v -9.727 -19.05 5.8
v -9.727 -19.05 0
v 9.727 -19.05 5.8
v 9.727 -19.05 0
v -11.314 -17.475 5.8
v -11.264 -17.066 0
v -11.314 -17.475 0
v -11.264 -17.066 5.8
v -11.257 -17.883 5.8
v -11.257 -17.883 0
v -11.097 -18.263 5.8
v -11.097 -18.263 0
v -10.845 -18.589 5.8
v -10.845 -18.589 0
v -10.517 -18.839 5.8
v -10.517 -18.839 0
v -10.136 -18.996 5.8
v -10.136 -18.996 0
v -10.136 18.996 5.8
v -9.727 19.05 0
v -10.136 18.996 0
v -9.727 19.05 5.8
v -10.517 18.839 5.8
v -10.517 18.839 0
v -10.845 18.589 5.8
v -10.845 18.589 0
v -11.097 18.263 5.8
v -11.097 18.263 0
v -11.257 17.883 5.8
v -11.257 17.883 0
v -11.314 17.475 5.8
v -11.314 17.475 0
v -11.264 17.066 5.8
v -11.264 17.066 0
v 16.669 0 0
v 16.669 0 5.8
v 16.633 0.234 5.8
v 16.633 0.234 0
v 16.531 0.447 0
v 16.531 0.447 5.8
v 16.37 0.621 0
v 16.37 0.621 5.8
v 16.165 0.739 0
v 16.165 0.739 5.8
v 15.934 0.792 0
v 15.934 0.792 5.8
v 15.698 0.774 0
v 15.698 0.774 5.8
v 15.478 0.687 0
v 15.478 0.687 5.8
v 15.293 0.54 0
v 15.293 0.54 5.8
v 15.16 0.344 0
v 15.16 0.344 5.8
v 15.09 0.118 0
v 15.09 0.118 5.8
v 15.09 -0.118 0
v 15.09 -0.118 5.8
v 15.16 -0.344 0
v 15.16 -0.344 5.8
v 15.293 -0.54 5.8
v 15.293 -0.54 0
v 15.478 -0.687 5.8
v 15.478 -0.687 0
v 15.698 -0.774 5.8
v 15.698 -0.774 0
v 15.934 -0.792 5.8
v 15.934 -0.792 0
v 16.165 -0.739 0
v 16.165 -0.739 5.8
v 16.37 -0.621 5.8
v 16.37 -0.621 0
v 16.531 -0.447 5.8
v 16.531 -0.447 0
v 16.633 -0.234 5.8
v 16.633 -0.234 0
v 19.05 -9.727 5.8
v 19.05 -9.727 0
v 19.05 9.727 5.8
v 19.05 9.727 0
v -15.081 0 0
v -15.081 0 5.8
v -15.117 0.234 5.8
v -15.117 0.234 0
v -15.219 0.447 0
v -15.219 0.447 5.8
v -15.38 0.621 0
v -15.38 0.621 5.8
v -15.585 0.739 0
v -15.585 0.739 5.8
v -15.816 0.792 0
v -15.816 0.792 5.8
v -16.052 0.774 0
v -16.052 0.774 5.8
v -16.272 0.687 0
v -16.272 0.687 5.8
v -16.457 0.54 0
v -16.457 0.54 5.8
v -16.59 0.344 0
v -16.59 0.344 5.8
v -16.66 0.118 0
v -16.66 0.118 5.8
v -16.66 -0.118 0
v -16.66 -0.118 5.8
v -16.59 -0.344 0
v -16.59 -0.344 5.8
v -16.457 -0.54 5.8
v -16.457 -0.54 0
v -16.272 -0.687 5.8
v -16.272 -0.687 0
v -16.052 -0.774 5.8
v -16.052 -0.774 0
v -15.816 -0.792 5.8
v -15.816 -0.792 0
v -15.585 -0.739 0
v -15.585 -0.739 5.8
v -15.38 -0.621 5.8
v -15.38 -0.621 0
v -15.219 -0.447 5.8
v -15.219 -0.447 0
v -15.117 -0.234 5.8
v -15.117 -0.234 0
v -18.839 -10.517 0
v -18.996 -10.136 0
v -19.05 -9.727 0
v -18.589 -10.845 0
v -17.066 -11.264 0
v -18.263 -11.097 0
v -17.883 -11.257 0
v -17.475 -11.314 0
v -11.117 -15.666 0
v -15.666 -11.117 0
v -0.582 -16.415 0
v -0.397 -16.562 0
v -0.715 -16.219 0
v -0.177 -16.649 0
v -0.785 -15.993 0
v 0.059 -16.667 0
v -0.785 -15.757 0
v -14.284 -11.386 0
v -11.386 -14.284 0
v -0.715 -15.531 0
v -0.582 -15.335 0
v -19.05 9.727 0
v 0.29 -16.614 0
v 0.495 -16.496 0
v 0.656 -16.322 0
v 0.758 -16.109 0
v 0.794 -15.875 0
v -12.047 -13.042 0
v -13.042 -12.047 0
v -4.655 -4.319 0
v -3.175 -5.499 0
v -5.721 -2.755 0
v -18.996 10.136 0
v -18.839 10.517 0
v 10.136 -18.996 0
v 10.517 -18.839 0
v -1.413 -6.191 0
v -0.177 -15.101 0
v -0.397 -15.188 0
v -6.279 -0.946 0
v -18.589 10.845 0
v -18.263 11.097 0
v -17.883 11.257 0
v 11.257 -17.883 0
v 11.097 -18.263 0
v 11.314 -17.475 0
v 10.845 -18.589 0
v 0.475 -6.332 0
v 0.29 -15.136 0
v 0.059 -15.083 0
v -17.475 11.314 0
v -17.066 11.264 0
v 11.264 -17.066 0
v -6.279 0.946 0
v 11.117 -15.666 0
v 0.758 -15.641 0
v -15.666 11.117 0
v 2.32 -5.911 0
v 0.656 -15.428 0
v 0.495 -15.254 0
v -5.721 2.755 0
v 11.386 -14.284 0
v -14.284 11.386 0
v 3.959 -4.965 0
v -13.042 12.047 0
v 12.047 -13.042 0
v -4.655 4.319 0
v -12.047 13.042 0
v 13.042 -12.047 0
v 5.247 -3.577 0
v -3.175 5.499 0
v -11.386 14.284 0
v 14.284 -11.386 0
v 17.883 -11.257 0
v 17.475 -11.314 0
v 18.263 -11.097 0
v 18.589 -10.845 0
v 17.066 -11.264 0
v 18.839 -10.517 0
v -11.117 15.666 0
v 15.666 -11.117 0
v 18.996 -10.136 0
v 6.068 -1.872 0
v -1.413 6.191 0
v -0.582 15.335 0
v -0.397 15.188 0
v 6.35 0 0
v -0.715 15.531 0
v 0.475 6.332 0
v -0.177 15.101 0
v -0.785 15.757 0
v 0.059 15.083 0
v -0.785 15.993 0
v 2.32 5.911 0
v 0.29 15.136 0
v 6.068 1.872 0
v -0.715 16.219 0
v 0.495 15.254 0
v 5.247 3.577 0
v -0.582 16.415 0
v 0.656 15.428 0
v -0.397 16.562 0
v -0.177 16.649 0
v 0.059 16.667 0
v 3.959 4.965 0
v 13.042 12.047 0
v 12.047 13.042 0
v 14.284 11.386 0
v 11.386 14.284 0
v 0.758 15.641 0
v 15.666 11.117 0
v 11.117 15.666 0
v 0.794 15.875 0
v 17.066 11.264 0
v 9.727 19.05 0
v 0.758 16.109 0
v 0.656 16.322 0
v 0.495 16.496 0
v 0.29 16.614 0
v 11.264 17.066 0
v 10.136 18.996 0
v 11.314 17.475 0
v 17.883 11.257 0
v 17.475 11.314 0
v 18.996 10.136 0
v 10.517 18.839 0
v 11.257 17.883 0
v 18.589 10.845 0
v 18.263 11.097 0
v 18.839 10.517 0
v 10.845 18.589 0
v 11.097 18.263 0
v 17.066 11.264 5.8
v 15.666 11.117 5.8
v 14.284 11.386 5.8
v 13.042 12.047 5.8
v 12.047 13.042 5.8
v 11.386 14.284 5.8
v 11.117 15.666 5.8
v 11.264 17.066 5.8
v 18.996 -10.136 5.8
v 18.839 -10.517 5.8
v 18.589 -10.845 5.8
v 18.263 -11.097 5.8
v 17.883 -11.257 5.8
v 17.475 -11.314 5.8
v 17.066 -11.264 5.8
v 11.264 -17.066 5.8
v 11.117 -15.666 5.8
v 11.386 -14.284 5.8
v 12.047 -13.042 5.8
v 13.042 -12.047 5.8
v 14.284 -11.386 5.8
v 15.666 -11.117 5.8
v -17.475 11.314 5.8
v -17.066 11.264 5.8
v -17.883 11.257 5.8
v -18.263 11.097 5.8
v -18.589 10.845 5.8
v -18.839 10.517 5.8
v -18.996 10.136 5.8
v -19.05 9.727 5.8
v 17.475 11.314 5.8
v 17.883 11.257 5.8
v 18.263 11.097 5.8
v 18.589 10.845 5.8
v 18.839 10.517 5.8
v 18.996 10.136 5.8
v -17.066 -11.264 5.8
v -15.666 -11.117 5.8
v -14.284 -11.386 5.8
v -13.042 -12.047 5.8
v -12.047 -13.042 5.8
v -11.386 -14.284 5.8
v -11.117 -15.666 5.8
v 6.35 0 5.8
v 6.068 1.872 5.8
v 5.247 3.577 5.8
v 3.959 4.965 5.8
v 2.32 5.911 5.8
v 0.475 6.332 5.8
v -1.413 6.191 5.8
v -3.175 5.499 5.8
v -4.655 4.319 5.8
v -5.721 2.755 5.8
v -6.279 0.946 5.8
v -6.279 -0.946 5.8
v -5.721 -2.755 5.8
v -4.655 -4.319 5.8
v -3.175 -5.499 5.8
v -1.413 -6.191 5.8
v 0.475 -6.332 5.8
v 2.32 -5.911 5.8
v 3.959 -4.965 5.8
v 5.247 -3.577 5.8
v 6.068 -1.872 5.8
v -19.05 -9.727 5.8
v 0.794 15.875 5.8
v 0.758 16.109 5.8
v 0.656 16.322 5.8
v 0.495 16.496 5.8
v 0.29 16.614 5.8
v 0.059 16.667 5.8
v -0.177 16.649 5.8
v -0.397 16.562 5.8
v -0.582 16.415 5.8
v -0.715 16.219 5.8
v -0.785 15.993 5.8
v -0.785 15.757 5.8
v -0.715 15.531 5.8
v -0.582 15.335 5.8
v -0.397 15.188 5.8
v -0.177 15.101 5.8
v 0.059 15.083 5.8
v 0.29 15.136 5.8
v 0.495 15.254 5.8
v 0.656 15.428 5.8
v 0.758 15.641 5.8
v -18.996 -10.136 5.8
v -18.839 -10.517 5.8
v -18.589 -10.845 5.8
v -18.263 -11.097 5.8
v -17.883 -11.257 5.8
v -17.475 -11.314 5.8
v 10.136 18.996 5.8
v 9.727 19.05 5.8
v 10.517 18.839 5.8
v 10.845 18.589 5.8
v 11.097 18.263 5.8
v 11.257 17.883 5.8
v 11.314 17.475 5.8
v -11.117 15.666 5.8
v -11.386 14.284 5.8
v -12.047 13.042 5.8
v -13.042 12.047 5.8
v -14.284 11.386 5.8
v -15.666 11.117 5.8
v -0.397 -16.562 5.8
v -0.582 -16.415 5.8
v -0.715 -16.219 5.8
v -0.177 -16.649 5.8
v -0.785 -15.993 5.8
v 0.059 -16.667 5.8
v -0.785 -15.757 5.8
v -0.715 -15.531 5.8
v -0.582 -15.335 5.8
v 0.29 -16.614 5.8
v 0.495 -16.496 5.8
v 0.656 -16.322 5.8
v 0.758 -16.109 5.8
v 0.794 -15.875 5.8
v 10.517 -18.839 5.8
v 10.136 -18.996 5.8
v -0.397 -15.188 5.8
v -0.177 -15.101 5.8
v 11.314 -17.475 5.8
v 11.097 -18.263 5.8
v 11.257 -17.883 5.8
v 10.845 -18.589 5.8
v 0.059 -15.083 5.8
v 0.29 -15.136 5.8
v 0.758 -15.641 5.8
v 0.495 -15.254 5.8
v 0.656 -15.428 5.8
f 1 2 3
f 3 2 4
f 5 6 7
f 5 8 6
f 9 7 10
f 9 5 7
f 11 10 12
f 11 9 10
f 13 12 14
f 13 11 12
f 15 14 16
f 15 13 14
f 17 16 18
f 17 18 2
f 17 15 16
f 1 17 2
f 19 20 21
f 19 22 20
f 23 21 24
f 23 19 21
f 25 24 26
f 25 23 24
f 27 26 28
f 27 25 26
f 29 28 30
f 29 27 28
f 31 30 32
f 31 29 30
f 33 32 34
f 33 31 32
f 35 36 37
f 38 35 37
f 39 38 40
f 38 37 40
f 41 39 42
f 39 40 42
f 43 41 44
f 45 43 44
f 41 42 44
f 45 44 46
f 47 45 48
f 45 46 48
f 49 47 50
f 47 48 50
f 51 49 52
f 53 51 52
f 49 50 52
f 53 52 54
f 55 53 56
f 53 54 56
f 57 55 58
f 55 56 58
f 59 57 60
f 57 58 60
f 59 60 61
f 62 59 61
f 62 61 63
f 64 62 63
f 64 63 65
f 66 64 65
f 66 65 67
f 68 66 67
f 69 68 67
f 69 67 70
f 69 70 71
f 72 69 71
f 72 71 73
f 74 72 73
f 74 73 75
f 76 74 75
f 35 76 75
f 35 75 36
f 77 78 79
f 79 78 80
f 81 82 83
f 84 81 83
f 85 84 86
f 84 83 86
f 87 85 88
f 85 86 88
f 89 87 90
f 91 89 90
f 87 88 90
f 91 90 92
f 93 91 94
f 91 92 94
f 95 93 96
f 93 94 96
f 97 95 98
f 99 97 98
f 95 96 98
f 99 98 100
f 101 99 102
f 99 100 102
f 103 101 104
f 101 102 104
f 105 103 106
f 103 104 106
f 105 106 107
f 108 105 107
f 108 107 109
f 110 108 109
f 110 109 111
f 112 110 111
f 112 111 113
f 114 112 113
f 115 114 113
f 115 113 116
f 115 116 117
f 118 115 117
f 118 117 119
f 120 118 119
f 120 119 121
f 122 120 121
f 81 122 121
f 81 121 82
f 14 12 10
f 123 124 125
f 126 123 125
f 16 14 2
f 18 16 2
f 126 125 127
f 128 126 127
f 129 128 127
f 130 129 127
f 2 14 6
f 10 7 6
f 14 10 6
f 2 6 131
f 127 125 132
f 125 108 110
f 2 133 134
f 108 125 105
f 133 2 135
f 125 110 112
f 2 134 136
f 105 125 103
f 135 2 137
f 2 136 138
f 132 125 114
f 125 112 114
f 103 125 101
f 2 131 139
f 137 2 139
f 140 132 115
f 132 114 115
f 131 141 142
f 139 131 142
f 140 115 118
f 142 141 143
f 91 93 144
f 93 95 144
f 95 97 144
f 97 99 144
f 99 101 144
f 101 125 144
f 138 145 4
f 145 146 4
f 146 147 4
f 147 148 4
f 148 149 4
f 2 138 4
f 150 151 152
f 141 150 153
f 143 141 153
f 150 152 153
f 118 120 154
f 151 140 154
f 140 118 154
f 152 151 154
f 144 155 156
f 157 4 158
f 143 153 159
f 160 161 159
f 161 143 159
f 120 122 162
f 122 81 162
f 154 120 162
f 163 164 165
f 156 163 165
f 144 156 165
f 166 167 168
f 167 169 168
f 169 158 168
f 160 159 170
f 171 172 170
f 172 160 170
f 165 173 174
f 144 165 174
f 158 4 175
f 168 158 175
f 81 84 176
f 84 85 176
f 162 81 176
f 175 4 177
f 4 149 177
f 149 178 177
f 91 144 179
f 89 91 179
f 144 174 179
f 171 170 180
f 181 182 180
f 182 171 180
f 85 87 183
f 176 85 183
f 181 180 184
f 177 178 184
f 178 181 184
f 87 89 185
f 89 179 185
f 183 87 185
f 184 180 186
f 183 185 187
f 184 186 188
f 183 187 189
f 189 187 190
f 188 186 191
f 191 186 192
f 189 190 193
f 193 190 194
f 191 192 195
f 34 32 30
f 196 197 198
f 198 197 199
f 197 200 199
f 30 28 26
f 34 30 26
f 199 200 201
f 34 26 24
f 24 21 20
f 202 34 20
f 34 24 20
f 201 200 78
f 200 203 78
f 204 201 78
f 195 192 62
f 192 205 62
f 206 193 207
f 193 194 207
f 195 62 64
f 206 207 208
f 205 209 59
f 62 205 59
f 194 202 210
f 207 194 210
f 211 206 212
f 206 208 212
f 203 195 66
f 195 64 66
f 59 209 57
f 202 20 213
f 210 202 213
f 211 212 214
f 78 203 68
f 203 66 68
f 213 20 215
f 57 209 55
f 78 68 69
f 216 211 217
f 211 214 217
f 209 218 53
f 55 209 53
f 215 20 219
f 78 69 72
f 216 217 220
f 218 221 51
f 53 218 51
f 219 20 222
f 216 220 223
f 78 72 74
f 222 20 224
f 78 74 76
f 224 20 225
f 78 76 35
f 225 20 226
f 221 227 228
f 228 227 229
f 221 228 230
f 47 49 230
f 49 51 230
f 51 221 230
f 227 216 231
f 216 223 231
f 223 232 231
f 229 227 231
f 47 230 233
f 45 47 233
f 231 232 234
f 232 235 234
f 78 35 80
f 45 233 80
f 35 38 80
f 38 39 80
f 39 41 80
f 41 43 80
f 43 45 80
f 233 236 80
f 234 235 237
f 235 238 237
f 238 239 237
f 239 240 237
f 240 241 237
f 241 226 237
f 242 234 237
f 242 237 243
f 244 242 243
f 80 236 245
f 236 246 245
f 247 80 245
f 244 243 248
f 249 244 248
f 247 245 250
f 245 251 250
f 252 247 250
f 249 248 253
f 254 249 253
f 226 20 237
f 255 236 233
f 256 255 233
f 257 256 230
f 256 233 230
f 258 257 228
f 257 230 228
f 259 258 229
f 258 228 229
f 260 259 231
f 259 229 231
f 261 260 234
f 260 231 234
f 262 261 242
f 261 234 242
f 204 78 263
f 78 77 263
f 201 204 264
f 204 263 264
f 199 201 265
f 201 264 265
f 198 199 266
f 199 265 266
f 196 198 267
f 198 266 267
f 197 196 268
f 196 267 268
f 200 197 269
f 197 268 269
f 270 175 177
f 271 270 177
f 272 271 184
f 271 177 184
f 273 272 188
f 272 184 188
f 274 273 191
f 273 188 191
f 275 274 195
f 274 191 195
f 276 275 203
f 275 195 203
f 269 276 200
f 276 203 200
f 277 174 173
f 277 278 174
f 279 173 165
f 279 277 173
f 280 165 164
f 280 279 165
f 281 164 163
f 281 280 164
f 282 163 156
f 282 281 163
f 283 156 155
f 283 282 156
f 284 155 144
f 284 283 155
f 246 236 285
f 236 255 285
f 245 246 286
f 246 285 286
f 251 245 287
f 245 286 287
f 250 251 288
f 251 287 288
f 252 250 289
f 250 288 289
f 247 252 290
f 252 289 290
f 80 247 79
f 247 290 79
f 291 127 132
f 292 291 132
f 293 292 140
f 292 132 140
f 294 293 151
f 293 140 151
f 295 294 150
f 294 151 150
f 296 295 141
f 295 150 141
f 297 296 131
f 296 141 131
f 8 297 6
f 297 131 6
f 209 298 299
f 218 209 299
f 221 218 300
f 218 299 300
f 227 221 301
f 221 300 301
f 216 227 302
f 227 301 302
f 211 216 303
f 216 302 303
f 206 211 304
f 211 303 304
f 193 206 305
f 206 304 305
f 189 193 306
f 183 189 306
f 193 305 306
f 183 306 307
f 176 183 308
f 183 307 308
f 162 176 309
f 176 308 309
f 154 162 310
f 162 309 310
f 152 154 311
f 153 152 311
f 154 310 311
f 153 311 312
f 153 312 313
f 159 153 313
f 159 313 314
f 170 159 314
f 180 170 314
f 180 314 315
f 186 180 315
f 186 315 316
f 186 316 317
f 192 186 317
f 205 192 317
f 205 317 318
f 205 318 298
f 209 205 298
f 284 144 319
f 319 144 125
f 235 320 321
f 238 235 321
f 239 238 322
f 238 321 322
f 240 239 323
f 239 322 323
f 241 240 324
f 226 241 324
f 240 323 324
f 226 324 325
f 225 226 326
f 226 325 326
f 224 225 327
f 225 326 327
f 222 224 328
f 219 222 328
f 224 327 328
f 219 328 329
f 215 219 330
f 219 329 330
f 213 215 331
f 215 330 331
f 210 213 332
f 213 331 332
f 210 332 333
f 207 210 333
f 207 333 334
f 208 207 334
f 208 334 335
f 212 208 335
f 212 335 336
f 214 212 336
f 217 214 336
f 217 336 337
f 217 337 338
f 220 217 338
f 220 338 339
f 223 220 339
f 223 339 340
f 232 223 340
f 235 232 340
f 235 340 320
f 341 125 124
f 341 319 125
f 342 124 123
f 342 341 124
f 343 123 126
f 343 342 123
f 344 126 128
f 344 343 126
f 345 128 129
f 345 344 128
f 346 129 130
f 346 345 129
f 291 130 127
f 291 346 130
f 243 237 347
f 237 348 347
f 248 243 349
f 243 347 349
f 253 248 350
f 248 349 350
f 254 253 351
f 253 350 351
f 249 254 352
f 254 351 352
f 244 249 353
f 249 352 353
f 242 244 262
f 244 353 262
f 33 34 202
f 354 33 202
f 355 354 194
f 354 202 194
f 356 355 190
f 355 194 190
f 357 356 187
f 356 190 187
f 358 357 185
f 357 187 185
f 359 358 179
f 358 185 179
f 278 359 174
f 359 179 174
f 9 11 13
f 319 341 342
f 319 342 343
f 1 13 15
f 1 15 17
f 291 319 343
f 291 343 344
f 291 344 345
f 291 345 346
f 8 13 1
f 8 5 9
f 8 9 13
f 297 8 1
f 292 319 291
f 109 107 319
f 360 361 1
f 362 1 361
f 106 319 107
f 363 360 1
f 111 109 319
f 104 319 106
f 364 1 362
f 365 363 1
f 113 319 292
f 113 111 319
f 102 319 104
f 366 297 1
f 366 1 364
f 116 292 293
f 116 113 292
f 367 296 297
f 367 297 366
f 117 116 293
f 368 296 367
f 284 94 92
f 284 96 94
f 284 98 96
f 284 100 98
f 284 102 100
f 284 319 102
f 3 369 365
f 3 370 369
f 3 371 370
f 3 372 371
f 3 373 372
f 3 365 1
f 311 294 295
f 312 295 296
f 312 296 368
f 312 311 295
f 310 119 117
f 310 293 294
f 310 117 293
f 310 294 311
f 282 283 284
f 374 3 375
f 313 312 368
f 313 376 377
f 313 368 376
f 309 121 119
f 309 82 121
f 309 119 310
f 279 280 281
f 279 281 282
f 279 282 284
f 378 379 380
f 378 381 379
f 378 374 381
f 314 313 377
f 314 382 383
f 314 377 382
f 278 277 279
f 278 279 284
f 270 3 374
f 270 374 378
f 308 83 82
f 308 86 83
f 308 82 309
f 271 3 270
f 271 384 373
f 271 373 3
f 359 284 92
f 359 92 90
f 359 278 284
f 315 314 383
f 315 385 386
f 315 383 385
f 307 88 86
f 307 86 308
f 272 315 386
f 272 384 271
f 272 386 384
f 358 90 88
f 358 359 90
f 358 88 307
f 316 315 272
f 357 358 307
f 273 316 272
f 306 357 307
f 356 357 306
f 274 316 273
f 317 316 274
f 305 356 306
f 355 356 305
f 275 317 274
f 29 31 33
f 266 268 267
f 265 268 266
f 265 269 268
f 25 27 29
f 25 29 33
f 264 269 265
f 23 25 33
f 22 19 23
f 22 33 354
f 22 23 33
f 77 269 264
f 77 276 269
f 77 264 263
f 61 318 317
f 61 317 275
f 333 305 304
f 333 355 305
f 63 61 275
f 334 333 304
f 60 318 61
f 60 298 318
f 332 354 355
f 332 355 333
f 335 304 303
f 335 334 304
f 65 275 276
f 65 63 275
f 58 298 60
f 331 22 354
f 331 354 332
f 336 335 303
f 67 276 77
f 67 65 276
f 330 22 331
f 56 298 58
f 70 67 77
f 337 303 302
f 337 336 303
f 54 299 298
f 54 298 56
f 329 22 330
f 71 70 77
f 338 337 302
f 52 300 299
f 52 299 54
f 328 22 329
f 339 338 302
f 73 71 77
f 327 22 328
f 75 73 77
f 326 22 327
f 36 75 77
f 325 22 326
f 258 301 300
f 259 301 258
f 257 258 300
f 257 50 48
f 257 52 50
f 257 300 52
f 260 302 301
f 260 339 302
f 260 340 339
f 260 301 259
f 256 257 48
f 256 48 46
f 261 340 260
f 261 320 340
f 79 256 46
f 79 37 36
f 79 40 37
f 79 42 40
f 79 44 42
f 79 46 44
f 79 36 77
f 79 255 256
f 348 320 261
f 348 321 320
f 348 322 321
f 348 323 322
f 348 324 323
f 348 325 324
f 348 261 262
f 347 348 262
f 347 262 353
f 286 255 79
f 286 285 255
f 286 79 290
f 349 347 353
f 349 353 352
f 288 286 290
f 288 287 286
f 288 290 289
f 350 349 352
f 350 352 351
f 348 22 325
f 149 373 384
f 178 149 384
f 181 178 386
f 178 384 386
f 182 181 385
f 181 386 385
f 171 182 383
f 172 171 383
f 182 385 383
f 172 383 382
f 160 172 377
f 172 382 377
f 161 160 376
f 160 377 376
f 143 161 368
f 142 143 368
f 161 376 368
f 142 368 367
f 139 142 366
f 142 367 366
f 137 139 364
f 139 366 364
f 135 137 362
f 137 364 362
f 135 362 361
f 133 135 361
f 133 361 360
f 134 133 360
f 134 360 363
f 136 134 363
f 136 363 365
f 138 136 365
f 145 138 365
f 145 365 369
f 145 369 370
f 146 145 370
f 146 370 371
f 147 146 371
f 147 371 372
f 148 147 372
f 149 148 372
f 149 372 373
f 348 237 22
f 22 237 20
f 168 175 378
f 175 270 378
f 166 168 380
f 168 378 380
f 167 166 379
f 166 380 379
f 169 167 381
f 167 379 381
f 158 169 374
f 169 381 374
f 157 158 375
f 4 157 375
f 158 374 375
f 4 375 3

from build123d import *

# Parameters (mm, degrees)
BOSS_EXTRUDE1_DEPTH = 5.8
SKETCH2_R           = 0.79375
CUT_EXTRUDE1_DEPTH  = 28.558029683
SKETCH3_R           = 6.35
CUT_EXTRUDE2_DEPTH  = 12.7
FILLET1_R           = 1.5875


with BuildPart() as part:
    # Sketch1 → Boss-Extrude1 (new body)
    with BuildSketch(Plane.XY):
        with BuildLine():
            Line((12.325242086, 19.05), (-12.325242086, 19.05))
            ThreePointArc((-12.325242086, 19.05), (-12.507403955, 12.507403955), (-19.05, 12.325242086))
            Line((-19.05, 12.325242086), (-19.05, -12.325242086))
            ThreePointArc((-19.05, -12.325242086), (-12.507403955, -12.507403955), (-12.325242086, -19.05))
            Line((-12.325242086, -19.05), (12.325242086, -19.05))
            ThreePointArc((12.325242086, -19.05), (12.507403955, -12.507403955), (19.05, -12.325242086))
            Line((19.05, -12.325242086), (19.05, 12.325242086))
            ThreePointArc((19.05, 12.325242086), (12.507403955, 12.507403955), (12.325242086, 19.05))
        make_face()
    extrude(amount=BOSS_EXTRUDE1_DEPTH)

    # Sketch2 → Cut-Extrude1 (cut, through all)
    with BuildSketch(Plane.XY.offset(5.8)):
        with Locations((0, 15.875)):
            Circle(SKETCH2_R)
        with Locations((15.875, 0)):
            Circle(SKETCH2_R)
        with Locations((0, -15.875)):
            Circle(SKETCH2_R)
        with Locations((-15.875, 0)):
            Circle(SKETCH2_R)
    extrude(amount=-CUT_EXTRUDE1_DEPTH, mode=Mode.SUBTRACT)

    # Sketch3 → Cut-Extrude2 (cut)
    with BuildSketch(Plane.XY.offset(5.8)):
        Circle(SKETCH3_R)
    extrude(amount=-CUT_EXTRUDE2_DEPTH, mode=Mode.SUBTRACT)

    # Fillet1
    fillet1_edges = [part.edges().sort_by_distance(p)[0] for p in [
        (-12.325242086, 19.05, 2.9),
        (12.325242086, 19.05, 2.9),
        (19.05, 12.325242086, 2.9),
        (19.05, -12.325242086, 2.9),
        (12.325242086, -19.05, 2.9),
        (-12.325242086, -19.05, 2.9),
        (-19.05, -12.325242086, 2.9),
        (-19.05, 12.325242086, 2.9),
    ]]
    fillet(fillet1_edges, radius=FILLET1_R)


solid = part.part
